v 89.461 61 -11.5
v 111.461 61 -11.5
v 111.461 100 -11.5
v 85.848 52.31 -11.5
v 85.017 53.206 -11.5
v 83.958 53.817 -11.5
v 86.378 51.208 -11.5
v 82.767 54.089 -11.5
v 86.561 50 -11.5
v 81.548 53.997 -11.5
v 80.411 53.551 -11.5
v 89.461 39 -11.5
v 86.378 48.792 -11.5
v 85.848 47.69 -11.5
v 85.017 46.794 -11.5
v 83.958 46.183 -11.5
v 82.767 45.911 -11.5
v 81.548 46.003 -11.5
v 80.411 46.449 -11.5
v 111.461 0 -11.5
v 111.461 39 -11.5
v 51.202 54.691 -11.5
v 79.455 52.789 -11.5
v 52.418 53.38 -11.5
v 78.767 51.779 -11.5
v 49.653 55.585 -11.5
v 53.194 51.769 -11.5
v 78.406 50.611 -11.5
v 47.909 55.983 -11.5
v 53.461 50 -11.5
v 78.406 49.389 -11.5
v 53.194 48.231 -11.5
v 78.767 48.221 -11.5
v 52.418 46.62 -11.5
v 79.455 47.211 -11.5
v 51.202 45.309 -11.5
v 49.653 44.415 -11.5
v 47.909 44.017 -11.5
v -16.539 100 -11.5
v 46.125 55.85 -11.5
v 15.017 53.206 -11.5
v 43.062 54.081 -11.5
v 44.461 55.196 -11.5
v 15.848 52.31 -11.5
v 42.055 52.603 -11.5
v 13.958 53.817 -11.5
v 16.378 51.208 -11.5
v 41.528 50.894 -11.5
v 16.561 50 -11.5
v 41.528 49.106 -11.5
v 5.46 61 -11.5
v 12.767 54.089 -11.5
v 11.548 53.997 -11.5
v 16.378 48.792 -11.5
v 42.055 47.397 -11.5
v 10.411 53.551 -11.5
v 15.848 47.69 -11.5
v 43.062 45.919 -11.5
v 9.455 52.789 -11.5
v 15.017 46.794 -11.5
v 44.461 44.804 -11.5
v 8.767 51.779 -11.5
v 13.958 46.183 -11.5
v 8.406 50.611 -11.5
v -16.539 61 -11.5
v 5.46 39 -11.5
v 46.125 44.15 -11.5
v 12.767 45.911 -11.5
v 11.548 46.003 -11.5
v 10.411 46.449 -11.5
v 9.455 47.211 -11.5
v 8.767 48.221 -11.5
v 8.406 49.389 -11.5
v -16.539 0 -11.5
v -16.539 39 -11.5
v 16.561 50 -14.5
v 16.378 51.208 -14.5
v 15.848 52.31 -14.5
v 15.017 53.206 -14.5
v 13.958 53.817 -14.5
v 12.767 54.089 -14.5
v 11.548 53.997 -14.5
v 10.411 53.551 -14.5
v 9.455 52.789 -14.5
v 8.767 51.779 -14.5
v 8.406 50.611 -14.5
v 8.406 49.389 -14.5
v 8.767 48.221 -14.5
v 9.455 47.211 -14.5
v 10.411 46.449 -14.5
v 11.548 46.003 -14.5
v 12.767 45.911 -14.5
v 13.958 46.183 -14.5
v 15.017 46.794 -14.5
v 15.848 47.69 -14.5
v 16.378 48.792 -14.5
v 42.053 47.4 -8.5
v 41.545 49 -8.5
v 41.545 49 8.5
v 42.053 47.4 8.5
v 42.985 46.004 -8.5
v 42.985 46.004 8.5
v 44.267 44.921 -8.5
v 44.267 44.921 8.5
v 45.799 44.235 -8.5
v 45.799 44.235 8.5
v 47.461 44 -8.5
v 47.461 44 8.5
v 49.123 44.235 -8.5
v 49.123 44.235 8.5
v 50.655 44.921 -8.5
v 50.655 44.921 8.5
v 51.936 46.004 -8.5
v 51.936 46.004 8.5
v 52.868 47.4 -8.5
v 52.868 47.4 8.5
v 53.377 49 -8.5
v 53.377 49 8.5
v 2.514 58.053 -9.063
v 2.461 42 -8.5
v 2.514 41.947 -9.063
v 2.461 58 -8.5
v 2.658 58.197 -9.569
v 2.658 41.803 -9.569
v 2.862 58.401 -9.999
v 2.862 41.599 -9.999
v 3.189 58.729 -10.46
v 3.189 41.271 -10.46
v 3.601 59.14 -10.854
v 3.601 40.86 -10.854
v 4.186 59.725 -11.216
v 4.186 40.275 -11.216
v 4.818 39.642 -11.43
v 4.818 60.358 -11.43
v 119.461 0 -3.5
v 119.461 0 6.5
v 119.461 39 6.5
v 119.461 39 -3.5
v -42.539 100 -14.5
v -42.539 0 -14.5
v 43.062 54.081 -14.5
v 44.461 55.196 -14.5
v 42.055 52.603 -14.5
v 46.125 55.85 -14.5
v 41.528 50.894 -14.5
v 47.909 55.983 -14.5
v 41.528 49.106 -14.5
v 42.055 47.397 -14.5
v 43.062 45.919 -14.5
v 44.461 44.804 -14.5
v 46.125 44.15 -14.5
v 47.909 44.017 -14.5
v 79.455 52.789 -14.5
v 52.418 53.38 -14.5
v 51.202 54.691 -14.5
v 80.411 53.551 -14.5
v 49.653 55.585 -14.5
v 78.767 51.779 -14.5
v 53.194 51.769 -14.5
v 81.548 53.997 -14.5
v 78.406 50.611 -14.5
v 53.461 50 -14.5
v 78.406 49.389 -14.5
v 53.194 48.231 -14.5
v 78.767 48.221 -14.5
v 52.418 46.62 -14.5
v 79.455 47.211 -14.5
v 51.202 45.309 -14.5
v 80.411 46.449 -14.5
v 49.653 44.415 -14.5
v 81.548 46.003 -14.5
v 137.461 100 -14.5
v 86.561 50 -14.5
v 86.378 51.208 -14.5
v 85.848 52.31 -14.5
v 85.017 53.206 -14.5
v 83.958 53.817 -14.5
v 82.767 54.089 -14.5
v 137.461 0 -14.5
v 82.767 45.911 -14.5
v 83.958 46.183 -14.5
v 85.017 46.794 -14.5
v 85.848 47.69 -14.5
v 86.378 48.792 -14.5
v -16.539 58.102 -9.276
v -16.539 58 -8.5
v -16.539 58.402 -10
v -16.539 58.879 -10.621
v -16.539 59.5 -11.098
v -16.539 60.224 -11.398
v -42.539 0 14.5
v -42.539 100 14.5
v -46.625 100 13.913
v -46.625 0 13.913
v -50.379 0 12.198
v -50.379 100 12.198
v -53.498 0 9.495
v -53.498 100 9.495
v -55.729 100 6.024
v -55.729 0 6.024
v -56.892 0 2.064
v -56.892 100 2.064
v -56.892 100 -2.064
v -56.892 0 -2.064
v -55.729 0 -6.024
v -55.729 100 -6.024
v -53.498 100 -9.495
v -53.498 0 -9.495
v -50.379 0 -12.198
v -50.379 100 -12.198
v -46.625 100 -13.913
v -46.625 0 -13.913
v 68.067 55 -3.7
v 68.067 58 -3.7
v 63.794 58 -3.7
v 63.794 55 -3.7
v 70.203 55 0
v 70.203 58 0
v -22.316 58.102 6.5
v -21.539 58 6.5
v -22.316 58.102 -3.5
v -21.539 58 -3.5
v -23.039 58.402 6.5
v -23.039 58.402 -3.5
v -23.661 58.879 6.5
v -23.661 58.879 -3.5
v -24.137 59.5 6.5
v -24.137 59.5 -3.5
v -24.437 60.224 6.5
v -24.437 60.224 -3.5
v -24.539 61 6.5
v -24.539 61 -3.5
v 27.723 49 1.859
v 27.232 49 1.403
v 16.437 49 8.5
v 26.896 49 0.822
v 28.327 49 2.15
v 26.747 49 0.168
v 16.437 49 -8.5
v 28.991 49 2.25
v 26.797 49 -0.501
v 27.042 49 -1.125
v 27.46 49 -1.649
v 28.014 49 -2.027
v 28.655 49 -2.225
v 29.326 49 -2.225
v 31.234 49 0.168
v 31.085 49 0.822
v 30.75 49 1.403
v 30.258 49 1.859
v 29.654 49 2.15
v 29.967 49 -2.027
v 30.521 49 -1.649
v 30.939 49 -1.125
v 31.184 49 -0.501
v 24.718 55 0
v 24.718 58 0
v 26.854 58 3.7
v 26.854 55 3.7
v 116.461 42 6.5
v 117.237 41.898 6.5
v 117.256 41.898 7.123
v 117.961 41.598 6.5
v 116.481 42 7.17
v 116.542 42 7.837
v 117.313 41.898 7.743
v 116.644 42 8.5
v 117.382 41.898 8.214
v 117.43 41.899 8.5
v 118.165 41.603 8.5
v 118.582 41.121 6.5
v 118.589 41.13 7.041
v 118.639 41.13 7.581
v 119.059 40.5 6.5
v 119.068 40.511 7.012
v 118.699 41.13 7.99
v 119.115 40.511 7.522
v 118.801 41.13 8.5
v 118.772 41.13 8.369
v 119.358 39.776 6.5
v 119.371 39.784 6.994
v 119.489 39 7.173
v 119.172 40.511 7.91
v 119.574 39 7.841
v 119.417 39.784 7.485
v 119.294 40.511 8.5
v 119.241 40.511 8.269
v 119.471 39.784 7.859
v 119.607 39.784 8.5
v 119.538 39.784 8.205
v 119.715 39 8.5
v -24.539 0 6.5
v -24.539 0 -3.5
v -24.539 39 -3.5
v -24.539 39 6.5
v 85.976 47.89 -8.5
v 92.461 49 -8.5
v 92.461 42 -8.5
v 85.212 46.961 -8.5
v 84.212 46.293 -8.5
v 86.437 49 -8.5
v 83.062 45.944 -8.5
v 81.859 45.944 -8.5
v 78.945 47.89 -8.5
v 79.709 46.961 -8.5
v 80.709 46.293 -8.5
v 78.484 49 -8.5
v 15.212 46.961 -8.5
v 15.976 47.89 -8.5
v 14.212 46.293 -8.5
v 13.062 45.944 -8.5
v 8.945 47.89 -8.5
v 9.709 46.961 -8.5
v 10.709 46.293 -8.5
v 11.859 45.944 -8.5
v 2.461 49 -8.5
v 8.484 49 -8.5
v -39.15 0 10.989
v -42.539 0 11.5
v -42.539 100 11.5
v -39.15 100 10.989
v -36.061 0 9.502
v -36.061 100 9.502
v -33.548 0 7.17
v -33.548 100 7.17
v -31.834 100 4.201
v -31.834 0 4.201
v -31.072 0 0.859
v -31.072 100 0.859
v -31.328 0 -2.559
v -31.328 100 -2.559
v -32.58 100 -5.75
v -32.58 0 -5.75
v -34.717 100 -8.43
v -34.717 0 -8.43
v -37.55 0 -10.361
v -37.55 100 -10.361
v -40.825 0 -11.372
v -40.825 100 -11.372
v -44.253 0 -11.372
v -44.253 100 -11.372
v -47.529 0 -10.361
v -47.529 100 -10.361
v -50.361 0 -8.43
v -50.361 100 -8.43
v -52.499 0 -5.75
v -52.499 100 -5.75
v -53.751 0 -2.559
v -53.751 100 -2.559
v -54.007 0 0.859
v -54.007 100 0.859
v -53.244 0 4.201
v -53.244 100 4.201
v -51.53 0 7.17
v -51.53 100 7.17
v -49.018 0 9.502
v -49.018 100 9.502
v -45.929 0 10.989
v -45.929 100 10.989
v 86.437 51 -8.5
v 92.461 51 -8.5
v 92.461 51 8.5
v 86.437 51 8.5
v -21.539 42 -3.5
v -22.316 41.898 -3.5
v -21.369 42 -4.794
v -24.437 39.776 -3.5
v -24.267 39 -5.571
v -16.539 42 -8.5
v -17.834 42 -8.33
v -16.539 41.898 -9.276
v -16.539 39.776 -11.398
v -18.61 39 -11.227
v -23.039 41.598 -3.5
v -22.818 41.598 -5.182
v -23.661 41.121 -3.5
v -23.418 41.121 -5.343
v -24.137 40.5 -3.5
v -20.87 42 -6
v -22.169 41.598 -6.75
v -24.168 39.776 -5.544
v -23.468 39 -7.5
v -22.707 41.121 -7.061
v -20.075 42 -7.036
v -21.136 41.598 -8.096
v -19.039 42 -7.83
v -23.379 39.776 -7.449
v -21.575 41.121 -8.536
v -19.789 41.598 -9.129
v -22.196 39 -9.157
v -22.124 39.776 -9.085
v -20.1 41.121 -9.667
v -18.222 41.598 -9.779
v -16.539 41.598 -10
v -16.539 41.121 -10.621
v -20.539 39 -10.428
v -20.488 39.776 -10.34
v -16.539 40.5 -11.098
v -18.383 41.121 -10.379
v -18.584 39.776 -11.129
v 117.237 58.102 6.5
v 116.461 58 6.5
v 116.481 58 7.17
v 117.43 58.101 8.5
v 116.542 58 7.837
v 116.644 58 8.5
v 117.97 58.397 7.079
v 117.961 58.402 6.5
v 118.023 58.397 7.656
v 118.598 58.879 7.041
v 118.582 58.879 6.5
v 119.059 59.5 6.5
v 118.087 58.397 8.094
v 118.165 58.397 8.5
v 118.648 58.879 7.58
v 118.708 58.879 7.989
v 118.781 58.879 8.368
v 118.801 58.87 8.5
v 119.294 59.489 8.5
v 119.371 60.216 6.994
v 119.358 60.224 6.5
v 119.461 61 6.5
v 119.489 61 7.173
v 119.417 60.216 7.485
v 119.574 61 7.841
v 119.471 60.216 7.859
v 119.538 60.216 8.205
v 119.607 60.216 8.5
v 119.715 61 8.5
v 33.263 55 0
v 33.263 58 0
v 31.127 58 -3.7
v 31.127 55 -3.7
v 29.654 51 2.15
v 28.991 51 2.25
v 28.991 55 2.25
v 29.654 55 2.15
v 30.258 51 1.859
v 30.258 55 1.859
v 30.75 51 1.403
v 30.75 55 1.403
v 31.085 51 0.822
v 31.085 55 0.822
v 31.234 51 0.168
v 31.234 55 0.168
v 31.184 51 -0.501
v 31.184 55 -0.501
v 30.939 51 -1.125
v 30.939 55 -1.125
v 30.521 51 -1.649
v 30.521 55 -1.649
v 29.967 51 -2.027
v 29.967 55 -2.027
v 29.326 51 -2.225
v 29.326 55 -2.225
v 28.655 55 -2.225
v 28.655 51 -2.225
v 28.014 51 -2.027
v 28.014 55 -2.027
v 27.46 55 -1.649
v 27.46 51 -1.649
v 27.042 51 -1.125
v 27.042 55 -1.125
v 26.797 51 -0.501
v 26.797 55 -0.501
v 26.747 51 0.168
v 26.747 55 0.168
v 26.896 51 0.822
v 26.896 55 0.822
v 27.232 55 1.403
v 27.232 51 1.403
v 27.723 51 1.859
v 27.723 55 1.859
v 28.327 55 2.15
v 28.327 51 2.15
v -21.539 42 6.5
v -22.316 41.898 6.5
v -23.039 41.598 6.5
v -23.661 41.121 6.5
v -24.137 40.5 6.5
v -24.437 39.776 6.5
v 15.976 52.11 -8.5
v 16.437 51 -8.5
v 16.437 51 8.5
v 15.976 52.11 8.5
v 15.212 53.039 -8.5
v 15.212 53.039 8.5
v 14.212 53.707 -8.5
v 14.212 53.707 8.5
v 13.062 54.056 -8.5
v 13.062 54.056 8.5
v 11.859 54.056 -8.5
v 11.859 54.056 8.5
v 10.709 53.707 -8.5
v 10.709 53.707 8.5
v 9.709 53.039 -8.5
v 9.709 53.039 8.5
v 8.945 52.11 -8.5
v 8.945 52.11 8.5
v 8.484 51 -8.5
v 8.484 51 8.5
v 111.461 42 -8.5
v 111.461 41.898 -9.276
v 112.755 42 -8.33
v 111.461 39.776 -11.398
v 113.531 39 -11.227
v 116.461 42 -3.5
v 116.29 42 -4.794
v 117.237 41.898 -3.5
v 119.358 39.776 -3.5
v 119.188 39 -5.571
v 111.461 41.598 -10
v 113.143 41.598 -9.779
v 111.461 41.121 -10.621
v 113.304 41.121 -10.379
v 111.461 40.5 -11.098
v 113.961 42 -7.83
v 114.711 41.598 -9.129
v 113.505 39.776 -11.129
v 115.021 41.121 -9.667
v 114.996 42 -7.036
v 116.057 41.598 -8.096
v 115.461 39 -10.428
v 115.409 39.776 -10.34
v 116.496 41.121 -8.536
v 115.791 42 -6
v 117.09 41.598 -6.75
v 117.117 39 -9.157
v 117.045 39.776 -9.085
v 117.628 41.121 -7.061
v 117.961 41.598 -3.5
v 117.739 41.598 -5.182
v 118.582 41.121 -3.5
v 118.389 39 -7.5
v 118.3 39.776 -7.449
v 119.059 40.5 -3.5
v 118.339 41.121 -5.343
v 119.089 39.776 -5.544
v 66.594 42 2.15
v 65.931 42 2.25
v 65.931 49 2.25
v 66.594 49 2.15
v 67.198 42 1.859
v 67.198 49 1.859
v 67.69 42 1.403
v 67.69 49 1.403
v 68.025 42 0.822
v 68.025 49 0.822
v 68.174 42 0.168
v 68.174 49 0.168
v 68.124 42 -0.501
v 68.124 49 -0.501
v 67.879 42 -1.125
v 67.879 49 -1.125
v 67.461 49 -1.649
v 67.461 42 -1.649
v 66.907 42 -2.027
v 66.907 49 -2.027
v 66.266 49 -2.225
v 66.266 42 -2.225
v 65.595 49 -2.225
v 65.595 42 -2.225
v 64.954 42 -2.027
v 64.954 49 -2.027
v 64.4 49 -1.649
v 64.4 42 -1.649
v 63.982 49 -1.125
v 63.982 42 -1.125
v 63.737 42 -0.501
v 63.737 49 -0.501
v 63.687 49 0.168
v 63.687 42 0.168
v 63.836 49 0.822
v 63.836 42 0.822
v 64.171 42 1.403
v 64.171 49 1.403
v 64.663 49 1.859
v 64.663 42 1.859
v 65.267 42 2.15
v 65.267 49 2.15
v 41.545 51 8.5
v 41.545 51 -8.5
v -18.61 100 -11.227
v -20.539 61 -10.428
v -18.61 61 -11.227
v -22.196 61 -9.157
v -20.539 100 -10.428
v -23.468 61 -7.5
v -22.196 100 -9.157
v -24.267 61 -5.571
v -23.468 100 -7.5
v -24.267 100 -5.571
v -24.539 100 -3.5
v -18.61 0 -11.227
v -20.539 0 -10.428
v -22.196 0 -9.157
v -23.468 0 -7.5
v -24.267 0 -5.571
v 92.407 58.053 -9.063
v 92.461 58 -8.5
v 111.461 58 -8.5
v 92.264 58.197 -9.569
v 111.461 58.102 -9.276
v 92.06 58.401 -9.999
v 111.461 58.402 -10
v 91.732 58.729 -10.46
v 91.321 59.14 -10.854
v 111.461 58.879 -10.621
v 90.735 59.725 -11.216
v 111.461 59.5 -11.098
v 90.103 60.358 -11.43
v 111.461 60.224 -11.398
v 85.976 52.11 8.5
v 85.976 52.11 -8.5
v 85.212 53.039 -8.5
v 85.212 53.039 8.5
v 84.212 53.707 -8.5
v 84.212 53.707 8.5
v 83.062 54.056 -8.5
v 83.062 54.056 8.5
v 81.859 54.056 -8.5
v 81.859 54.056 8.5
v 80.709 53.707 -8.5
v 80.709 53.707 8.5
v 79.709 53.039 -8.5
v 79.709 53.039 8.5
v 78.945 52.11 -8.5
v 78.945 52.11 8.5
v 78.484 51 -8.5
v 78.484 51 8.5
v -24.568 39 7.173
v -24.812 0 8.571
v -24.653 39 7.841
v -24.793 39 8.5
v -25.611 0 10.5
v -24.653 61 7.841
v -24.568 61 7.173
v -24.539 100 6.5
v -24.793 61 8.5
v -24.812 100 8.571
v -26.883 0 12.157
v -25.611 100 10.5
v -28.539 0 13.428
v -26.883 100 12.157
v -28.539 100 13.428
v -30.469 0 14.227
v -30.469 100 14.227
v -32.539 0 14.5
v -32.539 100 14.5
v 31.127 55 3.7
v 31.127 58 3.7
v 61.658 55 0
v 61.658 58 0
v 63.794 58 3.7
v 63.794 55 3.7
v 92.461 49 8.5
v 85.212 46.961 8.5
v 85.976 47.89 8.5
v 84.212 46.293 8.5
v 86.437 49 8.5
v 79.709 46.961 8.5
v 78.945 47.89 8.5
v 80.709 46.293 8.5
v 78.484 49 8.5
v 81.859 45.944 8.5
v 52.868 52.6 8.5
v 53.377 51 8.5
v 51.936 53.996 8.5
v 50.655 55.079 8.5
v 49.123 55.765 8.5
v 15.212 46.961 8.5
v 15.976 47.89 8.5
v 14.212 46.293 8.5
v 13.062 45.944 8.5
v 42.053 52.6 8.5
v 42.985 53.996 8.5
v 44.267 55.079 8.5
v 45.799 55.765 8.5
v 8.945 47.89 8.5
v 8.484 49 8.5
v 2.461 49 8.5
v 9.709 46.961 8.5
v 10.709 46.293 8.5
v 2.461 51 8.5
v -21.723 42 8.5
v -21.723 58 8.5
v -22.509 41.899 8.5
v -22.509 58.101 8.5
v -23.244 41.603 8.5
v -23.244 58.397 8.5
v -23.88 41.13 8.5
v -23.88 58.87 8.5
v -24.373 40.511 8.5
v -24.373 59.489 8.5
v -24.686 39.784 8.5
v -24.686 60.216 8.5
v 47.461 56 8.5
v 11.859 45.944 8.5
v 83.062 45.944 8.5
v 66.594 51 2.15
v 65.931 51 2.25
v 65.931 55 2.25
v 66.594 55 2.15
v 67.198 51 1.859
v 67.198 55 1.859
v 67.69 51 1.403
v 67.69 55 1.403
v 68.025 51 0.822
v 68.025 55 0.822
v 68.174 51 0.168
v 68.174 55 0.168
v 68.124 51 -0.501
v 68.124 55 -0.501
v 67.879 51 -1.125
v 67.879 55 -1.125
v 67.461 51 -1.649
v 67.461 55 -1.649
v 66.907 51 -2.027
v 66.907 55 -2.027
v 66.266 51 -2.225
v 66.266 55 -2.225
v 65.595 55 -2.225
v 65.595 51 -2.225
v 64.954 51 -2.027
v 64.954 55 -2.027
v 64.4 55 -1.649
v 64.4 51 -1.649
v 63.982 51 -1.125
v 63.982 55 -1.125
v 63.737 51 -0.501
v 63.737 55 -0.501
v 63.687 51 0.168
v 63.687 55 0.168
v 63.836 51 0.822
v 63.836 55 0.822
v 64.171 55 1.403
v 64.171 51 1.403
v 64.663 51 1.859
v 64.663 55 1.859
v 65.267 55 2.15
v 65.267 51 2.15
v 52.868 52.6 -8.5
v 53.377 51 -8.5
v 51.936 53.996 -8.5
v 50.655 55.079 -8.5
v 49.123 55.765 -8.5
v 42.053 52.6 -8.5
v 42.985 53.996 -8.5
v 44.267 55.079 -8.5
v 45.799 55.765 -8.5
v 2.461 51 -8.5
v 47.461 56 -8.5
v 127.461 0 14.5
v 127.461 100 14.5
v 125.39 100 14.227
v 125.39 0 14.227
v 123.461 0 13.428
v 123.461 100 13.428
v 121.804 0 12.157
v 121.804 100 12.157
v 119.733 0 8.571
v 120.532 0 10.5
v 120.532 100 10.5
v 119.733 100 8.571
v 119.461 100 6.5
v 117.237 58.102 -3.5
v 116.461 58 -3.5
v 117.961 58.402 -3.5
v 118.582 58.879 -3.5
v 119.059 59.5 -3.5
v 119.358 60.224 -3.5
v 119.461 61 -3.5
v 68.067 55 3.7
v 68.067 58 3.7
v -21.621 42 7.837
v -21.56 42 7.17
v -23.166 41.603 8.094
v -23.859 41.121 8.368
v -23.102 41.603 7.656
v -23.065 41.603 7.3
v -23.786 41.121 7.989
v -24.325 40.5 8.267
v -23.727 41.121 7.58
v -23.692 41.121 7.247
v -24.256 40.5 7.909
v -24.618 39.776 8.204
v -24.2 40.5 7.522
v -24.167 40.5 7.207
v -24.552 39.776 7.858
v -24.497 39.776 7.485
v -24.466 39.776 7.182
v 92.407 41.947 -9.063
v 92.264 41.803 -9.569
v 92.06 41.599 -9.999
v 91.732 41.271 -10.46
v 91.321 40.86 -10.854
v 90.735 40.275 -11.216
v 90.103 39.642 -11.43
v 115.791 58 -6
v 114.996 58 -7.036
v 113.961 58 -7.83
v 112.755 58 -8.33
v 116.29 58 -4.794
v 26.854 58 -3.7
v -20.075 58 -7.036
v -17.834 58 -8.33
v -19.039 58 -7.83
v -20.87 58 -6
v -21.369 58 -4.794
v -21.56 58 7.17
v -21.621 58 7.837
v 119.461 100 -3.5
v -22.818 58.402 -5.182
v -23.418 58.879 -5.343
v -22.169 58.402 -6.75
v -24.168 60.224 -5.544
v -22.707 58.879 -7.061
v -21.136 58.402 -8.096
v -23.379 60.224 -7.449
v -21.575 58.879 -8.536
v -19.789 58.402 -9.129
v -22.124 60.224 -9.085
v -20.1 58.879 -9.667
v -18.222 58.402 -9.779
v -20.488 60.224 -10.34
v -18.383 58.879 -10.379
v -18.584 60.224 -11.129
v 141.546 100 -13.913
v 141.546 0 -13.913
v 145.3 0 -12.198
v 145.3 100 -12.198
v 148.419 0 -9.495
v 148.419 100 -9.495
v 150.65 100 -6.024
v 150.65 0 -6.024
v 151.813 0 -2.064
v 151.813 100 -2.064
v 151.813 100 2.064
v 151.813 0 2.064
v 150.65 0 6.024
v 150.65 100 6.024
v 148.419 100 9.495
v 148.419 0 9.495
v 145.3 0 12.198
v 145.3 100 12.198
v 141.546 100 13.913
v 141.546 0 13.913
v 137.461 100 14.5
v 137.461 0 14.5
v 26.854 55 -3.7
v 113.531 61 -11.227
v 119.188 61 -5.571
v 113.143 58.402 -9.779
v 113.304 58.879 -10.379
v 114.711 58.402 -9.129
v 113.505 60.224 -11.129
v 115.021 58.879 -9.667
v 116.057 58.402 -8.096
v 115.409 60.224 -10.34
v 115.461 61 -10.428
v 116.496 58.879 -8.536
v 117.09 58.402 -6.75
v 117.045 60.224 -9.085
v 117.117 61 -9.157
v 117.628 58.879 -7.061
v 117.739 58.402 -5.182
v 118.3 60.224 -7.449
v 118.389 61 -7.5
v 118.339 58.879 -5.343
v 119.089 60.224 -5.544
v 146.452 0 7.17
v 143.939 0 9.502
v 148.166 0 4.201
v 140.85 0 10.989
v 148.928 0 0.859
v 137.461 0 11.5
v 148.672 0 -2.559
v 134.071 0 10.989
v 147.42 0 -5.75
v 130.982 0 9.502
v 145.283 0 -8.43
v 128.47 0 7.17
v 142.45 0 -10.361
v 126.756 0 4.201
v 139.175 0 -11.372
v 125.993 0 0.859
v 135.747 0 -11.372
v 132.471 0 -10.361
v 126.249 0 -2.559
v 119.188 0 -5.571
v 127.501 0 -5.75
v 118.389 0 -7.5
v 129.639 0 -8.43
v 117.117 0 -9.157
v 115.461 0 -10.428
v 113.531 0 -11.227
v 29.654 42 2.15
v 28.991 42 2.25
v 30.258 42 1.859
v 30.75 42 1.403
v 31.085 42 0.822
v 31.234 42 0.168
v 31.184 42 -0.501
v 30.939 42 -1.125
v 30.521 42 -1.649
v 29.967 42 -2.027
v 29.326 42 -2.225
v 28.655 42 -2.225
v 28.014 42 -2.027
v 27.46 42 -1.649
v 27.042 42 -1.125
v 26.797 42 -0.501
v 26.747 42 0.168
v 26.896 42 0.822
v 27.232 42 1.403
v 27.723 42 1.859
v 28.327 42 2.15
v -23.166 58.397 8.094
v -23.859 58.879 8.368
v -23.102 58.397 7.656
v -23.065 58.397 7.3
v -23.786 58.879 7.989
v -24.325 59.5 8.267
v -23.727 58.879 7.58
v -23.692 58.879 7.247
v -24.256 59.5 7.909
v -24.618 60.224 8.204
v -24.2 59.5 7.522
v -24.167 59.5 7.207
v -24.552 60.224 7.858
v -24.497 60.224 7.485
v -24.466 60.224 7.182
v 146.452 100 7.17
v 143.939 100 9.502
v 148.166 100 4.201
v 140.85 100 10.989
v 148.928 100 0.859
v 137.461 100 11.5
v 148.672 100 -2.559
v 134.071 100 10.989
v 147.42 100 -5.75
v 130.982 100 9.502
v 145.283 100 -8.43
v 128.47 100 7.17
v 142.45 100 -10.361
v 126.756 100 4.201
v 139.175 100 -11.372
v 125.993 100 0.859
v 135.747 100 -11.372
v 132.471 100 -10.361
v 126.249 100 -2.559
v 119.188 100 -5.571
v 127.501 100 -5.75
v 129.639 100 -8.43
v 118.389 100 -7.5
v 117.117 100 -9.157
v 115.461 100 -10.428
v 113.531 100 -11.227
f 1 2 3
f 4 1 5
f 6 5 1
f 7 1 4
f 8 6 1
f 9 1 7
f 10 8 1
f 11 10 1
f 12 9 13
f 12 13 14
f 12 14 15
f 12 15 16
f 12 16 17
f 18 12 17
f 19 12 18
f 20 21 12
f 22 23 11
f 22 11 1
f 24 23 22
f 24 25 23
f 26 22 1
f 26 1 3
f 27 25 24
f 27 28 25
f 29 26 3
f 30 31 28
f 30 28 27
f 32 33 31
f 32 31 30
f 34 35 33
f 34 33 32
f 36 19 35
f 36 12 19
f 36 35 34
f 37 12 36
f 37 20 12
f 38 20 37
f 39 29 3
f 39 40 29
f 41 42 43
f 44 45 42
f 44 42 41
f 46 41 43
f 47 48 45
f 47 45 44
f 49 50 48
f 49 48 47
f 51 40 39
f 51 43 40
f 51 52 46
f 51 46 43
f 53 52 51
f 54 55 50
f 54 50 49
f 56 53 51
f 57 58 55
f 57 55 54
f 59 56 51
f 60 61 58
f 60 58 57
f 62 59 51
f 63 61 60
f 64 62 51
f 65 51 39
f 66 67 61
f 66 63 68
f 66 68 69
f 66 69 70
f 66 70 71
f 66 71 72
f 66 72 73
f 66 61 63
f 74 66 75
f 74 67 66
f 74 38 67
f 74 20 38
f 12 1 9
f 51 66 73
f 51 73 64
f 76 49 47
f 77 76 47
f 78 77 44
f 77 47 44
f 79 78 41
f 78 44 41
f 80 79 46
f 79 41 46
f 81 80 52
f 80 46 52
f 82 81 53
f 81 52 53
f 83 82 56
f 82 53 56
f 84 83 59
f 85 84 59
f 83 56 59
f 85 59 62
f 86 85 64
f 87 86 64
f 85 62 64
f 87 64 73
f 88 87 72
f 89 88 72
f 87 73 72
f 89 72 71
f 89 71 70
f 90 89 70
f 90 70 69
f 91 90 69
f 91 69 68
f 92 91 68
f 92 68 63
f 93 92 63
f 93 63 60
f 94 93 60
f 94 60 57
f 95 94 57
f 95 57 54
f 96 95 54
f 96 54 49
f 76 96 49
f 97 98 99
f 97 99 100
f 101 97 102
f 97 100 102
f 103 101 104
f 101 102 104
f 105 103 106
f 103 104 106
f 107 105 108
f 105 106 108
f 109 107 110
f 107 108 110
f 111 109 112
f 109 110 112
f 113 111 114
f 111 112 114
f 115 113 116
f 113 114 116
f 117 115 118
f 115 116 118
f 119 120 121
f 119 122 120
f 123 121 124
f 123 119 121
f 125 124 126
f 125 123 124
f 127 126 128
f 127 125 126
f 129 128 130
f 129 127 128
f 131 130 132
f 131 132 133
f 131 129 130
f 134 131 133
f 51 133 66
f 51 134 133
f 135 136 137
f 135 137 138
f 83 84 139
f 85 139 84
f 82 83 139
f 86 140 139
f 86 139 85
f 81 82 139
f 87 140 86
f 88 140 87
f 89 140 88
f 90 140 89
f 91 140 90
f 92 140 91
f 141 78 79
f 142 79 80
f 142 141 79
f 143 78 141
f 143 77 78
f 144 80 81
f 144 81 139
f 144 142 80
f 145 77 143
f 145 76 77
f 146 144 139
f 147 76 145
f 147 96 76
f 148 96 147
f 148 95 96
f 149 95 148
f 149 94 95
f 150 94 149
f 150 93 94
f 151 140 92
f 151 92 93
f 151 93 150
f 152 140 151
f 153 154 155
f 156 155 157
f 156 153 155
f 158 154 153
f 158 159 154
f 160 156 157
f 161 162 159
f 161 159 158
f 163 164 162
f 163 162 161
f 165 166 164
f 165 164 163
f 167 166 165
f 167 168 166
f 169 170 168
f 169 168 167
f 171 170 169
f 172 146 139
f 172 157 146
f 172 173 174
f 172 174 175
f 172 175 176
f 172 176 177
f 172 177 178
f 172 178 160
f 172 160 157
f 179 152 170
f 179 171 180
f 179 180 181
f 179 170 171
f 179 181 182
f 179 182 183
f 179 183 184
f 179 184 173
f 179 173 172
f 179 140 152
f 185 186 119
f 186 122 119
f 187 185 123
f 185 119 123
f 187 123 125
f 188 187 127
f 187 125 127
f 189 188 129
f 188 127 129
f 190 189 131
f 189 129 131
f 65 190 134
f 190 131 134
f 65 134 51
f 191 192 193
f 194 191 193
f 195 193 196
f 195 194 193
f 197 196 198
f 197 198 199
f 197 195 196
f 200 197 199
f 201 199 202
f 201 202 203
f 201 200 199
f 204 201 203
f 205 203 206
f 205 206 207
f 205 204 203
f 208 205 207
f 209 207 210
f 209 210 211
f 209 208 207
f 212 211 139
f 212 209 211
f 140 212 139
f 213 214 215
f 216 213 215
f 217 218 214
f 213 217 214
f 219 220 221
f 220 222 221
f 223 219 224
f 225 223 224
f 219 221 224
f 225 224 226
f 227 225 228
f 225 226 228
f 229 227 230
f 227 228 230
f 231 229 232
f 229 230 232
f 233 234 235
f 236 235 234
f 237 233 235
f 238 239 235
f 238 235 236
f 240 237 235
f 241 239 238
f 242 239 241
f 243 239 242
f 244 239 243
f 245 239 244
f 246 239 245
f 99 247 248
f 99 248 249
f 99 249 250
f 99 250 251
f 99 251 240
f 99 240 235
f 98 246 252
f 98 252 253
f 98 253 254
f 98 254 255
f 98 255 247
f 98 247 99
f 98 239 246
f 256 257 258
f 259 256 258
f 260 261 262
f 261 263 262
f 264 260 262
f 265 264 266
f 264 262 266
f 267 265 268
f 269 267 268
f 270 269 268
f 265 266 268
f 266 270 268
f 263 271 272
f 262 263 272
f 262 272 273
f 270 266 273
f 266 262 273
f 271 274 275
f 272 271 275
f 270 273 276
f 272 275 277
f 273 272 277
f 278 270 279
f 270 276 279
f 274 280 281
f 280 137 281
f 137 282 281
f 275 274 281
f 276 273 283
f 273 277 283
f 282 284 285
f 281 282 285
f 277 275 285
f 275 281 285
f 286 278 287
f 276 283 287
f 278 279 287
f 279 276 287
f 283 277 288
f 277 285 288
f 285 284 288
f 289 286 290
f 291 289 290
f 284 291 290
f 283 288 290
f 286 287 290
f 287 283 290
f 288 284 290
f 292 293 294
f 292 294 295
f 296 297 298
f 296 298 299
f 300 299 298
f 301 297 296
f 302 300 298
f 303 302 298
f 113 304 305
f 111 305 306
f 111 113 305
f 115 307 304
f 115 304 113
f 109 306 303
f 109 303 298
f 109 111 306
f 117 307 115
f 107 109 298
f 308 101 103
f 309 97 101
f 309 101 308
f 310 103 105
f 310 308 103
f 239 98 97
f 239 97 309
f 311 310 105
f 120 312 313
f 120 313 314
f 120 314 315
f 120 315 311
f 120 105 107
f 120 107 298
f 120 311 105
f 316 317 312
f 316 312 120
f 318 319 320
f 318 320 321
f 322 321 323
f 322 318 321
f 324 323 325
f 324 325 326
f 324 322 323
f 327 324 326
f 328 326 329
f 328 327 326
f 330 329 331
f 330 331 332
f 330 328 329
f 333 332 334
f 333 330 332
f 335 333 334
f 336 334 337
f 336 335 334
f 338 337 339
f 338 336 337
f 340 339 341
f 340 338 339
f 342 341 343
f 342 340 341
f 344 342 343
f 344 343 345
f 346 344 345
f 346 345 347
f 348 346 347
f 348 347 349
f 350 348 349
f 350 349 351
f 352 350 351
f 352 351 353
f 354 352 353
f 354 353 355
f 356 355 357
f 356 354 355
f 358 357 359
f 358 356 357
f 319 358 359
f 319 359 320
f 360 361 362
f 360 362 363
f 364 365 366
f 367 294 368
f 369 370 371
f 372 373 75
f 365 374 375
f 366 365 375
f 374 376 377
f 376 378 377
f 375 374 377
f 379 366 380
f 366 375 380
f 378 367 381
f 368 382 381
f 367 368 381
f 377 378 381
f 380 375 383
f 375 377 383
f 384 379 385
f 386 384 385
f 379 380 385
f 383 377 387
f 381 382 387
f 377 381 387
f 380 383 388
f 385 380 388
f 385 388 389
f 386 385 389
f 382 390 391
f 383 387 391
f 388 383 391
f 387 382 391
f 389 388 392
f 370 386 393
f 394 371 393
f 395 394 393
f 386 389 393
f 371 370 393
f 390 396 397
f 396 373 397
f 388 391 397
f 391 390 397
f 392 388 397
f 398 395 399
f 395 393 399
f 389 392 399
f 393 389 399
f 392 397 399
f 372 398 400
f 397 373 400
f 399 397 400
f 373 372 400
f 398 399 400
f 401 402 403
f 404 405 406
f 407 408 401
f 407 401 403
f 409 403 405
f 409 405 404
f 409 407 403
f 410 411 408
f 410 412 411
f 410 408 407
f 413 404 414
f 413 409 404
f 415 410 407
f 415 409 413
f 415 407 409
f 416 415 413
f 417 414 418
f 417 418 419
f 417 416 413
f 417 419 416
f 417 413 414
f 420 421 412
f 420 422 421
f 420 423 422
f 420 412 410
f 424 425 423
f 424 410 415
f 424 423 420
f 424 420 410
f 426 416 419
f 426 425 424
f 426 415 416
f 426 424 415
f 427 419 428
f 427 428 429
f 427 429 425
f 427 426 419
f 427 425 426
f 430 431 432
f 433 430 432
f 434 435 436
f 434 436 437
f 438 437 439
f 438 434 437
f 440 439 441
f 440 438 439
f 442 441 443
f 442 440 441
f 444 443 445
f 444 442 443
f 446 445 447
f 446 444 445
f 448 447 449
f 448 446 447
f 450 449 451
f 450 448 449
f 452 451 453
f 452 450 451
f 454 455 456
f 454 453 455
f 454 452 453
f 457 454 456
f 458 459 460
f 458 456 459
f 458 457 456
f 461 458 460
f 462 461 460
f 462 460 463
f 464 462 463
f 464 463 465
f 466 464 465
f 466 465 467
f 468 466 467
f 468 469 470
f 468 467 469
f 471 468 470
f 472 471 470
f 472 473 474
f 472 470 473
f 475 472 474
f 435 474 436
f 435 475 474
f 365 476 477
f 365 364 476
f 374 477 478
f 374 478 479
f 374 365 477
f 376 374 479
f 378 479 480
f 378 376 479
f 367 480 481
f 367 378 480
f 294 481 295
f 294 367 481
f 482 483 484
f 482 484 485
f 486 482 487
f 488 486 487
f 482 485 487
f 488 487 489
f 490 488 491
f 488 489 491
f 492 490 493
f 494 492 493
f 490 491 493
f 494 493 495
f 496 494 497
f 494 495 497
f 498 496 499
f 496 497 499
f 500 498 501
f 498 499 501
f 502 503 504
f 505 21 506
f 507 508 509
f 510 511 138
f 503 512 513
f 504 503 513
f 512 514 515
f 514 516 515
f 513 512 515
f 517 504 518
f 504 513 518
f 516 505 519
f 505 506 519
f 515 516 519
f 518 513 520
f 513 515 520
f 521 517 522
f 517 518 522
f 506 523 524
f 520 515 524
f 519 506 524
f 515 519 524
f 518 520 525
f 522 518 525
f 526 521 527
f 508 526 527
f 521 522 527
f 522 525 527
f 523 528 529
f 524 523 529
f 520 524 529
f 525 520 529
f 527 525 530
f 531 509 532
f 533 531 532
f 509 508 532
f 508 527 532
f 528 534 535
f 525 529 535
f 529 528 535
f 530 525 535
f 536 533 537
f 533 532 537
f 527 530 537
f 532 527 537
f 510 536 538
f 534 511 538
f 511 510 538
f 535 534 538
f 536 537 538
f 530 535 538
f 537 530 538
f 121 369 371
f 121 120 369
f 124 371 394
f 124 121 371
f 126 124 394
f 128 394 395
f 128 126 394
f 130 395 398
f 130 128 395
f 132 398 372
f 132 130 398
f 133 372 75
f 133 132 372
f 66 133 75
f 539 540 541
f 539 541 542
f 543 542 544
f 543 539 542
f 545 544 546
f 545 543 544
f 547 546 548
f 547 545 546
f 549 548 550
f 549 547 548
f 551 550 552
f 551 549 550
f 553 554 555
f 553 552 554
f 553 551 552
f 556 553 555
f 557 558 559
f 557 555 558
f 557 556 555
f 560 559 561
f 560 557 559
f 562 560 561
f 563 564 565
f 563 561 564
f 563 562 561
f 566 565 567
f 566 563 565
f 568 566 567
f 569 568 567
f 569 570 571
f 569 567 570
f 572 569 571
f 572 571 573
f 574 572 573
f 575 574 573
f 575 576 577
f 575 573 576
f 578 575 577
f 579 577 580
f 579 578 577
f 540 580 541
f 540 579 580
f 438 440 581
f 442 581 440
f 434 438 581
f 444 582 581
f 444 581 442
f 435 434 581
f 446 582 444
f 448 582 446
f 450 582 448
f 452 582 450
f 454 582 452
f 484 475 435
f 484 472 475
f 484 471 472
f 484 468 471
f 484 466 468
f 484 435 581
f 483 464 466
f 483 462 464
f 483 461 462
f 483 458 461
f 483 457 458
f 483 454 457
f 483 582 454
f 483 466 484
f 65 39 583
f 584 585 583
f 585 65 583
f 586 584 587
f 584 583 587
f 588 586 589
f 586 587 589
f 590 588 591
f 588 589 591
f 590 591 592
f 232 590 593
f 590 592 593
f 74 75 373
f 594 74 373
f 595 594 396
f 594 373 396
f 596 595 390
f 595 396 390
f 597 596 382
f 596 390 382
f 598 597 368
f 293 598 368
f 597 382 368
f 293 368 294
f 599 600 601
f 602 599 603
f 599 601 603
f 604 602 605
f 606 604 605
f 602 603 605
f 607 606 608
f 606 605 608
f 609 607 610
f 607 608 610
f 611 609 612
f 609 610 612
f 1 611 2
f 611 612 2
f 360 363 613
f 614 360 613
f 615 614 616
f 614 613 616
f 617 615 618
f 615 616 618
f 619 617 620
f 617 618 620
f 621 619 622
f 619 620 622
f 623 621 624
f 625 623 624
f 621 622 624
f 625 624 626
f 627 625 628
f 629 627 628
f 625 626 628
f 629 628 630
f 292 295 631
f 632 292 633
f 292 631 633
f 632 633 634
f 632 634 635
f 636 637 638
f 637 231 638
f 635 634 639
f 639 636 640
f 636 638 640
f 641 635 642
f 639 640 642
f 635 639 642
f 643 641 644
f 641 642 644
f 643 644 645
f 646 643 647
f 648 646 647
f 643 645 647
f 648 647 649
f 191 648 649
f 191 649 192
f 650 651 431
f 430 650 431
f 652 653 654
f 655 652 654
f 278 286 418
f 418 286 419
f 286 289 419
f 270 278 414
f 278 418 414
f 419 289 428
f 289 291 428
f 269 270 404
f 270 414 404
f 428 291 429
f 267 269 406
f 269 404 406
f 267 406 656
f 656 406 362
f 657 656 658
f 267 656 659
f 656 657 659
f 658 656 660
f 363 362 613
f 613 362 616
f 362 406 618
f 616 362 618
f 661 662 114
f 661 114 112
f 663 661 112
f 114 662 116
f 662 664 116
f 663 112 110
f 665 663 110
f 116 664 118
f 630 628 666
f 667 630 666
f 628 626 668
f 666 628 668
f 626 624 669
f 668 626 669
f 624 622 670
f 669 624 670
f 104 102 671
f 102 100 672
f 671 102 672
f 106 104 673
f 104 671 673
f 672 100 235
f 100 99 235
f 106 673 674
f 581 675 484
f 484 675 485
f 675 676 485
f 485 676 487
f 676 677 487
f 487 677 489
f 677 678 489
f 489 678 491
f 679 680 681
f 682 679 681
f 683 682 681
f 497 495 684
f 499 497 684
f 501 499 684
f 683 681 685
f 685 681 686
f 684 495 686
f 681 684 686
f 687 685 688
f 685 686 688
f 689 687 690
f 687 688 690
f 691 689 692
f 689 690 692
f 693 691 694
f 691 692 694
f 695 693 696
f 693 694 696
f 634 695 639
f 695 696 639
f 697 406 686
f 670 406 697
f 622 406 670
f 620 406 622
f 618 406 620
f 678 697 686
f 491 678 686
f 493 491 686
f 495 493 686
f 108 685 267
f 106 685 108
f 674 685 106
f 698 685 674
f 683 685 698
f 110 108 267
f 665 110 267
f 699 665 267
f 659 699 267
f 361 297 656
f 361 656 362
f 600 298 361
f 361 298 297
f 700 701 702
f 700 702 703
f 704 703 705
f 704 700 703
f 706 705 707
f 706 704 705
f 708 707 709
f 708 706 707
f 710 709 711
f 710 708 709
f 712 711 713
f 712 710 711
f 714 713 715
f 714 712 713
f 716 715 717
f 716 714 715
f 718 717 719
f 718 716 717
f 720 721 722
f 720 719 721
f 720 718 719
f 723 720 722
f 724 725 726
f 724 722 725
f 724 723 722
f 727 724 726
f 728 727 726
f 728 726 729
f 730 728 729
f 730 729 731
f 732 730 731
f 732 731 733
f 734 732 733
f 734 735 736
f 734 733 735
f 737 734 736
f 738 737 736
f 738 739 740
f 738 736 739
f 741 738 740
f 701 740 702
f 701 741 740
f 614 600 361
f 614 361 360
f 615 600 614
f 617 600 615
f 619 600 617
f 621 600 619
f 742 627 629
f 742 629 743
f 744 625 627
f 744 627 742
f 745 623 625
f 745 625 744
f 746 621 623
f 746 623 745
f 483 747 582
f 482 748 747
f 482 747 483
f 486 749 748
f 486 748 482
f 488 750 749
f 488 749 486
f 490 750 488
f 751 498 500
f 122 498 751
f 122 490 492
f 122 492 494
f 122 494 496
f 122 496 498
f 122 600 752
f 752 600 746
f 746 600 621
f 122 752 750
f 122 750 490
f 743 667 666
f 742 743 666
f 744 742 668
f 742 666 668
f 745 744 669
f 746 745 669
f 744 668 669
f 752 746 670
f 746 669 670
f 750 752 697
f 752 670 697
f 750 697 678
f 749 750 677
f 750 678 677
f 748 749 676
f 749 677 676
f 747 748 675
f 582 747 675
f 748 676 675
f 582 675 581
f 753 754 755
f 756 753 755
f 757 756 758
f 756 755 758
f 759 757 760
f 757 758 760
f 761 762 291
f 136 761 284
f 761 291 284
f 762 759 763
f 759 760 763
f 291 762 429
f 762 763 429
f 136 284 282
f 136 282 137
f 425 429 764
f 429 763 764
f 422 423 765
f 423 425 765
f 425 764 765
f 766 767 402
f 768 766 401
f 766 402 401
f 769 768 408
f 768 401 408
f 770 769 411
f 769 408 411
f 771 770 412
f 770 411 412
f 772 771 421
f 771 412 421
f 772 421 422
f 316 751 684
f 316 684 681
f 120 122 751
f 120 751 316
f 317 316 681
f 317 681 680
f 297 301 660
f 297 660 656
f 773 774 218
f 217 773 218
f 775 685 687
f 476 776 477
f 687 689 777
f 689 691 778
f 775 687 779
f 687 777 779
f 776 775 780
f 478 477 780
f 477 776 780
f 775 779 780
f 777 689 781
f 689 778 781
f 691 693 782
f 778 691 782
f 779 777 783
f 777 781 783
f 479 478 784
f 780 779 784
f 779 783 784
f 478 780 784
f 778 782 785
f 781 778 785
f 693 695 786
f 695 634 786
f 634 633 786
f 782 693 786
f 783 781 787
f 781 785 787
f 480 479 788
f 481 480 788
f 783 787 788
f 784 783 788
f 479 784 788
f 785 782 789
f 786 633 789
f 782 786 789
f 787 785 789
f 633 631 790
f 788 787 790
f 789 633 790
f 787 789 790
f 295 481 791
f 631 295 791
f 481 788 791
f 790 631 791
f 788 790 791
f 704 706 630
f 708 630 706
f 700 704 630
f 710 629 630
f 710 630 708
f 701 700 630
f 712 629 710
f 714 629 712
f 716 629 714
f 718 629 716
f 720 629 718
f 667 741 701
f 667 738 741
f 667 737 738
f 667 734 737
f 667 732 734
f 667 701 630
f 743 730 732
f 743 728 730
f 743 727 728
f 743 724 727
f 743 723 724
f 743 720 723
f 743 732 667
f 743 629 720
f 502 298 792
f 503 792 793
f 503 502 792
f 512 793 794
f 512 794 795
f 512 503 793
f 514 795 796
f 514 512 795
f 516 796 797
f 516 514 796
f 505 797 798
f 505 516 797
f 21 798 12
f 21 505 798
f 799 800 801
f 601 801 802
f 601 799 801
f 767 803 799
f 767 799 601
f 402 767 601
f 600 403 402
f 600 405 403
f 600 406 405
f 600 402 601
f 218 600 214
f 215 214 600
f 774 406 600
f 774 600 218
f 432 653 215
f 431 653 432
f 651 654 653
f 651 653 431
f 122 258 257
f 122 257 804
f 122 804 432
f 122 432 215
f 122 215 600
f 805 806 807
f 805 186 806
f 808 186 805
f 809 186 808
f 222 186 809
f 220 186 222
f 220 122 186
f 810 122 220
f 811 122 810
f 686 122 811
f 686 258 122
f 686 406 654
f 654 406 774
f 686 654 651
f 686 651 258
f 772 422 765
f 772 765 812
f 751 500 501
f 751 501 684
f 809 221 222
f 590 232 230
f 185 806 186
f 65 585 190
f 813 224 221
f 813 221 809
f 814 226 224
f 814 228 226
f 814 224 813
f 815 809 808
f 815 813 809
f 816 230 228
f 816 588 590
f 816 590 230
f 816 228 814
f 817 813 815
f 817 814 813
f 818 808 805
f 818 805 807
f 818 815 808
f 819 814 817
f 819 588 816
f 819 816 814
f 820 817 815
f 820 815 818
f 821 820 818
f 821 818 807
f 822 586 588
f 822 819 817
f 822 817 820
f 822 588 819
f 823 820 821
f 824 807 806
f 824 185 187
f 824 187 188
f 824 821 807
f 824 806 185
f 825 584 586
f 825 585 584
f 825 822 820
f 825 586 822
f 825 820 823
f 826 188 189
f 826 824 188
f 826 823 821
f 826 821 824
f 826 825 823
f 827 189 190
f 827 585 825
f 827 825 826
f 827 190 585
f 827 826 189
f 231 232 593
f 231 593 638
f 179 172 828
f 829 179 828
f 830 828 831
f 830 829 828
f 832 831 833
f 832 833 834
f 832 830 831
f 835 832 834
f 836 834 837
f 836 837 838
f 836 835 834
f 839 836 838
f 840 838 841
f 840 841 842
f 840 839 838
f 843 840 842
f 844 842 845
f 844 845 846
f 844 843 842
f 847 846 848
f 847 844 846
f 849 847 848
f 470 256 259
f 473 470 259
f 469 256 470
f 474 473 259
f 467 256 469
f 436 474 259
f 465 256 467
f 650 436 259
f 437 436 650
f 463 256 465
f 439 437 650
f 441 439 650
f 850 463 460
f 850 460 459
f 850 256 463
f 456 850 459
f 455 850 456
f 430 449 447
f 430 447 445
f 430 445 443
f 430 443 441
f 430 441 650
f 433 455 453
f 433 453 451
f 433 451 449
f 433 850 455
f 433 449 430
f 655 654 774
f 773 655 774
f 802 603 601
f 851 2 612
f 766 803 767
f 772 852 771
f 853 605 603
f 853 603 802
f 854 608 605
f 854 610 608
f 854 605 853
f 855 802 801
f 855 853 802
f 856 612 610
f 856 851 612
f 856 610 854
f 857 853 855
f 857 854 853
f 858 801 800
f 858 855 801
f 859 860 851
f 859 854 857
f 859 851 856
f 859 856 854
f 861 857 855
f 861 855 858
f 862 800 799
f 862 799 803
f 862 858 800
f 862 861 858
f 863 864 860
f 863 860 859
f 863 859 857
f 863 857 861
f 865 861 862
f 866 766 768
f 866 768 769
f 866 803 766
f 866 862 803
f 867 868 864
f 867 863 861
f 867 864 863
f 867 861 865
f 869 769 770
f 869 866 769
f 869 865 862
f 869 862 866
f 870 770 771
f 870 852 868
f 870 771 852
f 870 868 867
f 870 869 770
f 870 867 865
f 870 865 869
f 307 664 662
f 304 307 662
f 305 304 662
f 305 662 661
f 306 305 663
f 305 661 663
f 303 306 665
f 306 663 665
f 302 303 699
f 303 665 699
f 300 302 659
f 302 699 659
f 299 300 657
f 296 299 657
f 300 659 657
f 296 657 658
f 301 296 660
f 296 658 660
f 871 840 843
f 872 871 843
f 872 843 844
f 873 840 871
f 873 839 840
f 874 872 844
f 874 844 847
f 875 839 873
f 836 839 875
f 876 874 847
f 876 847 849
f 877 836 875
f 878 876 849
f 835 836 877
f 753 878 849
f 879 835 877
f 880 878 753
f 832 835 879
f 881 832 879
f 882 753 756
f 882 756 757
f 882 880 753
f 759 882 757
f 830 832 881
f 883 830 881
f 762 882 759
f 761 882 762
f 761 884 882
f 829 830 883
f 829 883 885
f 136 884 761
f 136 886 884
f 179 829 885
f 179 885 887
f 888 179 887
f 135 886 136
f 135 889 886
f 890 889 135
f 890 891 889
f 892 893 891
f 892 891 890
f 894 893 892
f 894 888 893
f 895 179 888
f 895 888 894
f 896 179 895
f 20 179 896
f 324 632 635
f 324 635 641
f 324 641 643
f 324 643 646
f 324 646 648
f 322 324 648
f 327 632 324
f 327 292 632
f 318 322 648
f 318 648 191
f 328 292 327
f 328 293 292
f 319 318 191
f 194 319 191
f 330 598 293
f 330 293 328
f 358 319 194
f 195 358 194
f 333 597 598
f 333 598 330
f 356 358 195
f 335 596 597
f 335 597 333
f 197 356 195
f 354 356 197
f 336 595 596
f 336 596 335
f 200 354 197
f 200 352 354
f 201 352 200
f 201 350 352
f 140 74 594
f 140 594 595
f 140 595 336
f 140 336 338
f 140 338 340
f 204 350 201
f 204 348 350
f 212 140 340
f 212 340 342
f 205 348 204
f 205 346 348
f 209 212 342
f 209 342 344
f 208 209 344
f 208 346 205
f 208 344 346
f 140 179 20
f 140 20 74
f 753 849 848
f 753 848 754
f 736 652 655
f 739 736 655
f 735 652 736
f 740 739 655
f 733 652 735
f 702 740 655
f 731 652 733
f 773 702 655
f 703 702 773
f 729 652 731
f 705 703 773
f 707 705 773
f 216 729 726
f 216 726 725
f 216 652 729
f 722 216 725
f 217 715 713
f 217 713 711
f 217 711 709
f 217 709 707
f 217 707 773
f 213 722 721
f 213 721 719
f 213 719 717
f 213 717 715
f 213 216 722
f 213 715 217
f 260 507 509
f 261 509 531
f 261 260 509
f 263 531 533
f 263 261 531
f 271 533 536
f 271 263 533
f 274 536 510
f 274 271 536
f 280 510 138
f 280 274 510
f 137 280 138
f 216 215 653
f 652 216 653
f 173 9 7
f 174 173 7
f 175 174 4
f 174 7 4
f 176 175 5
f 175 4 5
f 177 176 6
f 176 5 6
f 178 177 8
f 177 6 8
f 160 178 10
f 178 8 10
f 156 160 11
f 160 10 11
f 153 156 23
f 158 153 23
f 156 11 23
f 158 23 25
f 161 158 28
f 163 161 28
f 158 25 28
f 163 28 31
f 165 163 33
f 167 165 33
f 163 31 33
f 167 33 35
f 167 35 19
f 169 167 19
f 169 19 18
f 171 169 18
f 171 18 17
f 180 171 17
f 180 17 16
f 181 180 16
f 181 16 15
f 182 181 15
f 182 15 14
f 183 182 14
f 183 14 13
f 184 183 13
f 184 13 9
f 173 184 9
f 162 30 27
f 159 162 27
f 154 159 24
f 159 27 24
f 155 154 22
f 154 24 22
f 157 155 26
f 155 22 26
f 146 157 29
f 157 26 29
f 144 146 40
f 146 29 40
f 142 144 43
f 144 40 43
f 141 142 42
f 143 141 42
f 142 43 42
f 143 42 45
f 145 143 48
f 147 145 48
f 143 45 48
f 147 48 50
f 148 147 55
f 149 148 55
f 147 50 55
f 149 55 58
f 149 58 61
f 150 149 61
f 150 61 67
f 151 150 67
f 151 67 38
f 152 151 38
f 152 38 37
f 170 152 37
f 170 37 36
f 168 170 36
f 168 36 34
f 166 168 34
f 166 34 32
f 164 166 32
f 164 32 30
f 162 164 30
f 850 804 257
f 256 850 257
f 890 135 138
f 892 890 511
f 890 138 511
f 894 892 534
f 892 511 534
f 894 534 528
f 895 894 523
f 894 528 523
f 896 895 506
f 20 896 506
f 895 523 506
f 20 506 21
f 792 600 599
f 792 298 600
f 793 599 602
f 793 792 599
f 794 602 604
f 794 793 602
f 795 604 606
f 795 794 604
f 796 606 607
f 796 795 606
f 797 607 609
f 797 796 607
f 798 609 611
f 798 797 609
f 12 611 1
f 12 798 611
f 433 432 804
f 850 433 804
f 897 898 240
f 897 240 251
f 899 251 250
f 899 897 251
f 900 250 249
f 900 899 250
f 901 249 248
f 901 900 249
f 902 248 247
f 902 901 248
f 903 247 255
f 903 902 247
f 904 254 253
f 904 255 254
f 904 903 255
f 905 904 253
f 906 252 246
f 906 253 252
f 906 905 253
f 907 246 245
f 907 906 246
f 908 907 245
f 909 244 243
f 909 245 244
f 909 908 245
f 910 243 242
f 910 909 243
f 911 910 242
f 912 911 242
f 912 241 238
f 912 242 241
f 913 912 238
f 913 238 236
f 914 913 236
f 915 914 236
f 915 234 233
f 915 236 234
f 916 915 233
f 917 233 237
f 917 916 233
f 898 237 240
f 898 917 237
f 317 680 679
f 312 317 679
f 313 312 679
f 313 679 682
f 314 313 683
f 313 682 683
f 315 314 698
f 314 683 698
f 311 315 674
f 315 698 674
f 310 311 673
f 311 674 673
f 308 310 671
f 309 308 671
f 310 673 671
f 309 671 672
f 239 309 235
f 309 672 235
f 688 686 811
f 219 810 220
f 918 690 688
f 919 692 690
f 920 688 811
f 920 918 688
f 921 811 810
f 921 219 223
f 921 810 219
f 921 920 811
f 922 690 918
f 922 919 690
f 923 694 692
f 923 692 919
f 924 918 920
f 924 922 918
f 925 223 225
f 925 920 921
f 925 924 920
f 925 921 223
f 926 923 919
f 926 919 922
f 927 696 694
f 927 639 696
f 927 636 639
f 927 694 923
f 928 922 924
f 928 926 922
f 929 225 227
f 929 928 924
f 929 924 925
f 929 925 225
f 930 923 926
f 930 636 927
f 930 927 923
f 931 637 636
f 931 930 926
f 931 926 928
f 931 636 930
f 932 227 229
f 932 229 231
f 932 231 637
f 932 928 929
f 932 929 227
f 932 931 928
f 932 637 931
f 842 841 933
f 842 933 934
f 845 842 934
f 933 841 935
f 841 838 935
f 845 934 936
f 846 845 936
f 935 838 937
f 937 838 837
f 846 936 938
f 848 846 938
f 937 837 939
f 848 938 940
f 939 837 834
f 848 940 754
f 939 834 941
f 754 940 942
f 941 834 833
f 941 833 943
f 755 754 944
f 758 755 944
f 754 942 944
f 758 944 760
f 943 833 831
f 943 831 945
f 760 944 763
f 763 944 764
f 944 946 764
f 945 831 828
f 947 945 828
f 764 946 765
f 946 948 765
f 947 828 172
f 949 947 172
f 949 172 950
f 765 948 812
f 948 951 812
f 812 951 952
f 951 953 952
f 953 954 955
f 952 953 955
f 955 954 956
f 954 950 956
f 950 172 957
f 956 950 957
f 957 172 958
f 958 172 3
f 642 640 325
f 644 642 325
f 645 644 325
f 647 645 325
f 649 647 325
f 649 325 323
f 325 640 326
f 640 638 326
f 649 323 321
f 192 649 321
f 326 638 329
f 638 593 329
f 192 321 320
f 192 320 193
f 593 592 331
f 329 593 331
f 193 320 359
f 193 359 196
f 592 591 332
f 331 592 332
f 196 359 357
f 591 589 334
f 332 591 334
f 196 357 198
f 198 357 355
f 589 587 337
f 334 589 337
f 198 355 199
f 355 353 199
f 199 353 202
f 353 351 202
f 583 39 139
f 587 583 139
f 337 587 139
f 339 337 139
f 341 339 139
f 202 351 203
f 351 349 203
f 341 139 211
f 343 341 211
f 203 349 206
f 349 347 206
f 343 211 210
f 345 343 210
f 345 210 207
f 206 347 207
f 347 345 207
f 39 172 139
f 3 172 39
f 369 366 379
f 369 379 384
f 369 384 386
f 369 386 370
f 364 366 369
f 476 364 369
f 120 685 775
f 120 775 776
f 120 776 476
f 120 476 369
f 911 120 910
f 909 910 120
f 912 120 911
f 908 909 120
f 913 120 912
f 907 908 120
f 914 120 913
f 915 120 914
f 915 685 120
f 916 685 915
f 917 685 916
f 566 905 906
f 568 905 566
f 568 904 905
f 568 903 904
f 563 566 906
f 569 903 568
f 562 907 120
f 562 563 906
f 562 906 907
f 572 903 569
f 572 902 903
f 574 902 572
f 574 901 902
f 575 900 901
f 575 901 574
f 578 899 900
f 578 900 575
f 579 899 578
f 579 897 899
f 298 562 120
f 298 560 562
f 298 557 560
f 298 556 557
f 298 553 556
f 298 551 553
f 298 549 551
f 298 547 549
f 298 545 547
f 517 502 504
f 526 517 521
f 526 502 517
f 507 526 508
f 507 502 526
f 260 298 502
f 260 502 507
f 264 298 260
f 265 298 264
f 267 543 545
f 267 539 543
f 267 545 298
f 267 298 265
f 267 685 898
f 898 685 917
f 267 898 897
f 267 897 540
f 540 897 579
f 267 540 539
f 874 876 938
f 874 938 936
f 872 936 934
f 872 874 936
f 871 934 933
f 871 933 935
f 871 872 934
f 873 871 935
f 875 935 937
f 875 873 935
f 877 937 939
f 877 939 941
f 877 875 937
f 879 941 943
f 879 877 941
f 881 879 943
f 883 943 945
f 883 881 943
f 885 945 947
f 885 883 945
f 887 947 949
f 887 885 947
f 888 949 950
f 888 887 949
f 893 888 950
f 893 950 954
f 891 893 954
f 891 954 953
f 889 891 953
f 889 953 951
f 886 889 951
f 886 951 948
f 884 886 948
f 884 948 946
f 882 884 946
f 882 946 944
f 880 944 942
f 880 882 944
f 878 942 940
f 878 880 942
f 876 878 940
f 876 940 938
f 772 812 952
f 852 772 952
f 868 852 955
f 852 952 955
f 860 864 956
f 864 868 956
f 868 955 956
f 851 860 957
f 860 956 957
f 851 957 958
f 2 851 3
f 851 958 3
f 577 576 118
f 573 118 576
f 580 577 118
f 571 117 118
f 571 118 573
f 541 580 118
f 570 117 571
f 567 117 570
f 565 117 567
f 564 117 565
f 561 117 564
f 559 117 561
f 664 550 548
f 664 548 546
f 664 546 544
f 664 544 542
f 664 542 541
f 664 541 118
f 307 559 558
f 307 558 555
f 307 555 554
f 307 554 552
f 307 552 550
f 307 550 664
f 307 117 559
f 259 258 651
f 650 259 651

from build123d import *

# Parameters (mm, degrees)
SKETCH1_R                    = 11.5
BOSS_EXTRUDE1_DEPTH          = 100
FILLET1_R                    = 8
SKETCH2_R                    = 4.1
SKETCH2_R_2                  = 6
CUT_EXTRUDE1_DEPTH           = 10
BOSS_EXTRUDE2_START          = 20
SKETCH3_R                    = 4.1
SKETCH3_R_2                  = 6
BOSS_EXTRUDE2_DEPTH          = 20
FILLET2_R                    = 3
CUT_EXTRUDE_THIN1_DEPTH      = 184.360351078
CUT_EXTRUDE_THIN1_DEPTH_BACK = 20
CUT_EXTRUDE_THIN2_DEPTH      = 164.298096582
CUT_EXTRUDE_THIN2_DEPTH_BACK = 20
FILLET3_R                    = 3
CUT_EXTRUDE2_DEPTH           = 161.944923335
CUT_EXTRUDE2_DEPTH_BACK      = 161.944923335
SKETCH6_R                    = 2.25
CUT_EXTRUDE3_DEPTH           = 3


with BuildPart() as part:
    # Sketch1 → Boss-Extrude1 (new body)
    with BuildSketch(Plane(origin=(0, 0, 0), x_dir=(1, 0, 0), z_dir=(0, 1, 0))):
        with BuildLine():
            Line((137.460581558, -14.5), (119.460581558, -14.5))
            Line((119.460581558, -14.5), (119.460581558, 11.5))
            Line((119.460581558, 11.5), (-24.539418442, 11.5))
            Line((-24.539418442, 11.5), (-24.539418442, -14.5))
            Line((-24.539418442, -14.5), (-42.539418442, -14.5))
            ThreePointArc((-42.539418442, -14.5), (-57.039418442, 0), (-42.539418442, 14.5))
            Line((-42.539418442, 14.5), (137.460581558, 14.5))
            ThreePointArc((137.460581558, 14.5), (151.960581558, 0), (137.460581558, -14.5))
        make_face()
        with Locations(Location((-42.539418442, 0, 0), (0, 0, 270))):
            Circle(SKETCH1_R, mode=Mode.SUBTRACT)
        with Locations(Location((137.460581558, 0, 0), (0, 0, 270))):
            Circle(SKETCH1_R, mode=Mode.SUBTRACT)
    extrude(amount=BOSS_EXTRUDE1_DEPTH)

    # Fillet1
    fillet1_edges = [part.edges().sort_by_distance(p)[0] for p in [
        (119.460581558, 50, 14.5),
        (119.460581558, 50, -11.5),
        (-24.539418442, 50, -11.5),
        (-24.539418442, 50, 14.5),
    ]]
    fillet(fillet1_edges, radius=FILLET1_R)

    # Sketch2 → Cut-Extrude1 (cut)
    with BuildSketch(Plane.XY.offset(-11.5)):
        with Locations((12.460581558, 50)):
            Circle(SKETCH2_R)
        with Locations((82.460581558, 50)):
            Circle(SKETCH2_R)
        with Locations((47.460581558, 50)):
            Circle(SKETCH2_R_2)
    extrude(amount=-CUT_EXTRUDE1_DEPTH, mode=Mode.SUBTRACT)

    # Sketch3 → Boss-Extrude2 (add)
    with BuildSketch(Plane.XY.offset(-11.5).offset(BOSS_EXTRUDE2_START)):
        Polygon((12.460581558, 58), (82.460581558, 58), (124.149440998, 58), (124.149440998, 42), (82.460581558, 42), (12.460581558, 42), (-28.8662965, 42), (-28.8662965, 58), (-16.539418442, 58), align=None)
        with Locations((12.460581558, 50)):
            Circle(SKETCH3_R, mode=Mode.SUBTRACT)
        with Locations((82.460581558, 50)):
            Circle(SKETCH3_R, mode=Mode.SUBTRACT)
        with Locations((47.460581558, 50)):
            Circle(SKETCH3_R_2, mode=Mode.SUBTRACT)
    extrude(amount=-BOSS_EXTRUDE2_DEPTH)

    # Fillet2
    fillet2_edges = [part.edges().sort_by_distance(p)[0] for p in [
        (-24.603180872, 58, 7.50803434),
        (-24.603180872, 42, 7.50803434),
        (47.460581558, 42, -11.5),
        (117.117435807, 42, -9.156854249),
        (119.460581558, 42, 1.5),
        (-24.539418442, 42, 1.5),
        (-22.196272692, 42, -9.156854249),
        (119.524343988, 42, 7.50803434),
        (119.460581558, 58, 1.5),
        (117.117435807, 58, -9.156854249),
        (47.460581558, 58, -11.5),
        (-22.196272692, 58, -9.156854249),
        (-24.539418442, 58, 1.5),
        (119.524343988, 58, 7.50803434),
    ]]
    fillet(fillet2_edges, radius=FILLET2_R)

    # Sketch4 → Cut-Extrude-Thin1 (cut, two sides: drawn at the far end of the back side and taken through both)
    with BuildSketch(Plane.XY.offset(8.5).offset(-CUT_EXTRUDE_THIN1_DEPTH_BACK)):
        Polygon((92.460581558, 51), (47.460581558, 51), (2.460581558, 51), (2.460581558, 49), (47.460581558, 49), (92.460581558, 49), align=None)
    extrude(amount=CUT_EXTRUDE_THIN1_DEPTH + CUT_EXTRUDE_THIN1_DEPTH_BACK, mode=Mode.SUBTRACT)

    # Sketch5 → Cut-Extrude-Thin2 (cut, two sides: drawn at the far end of the back side and taken through both)
    with BuildSketch(Plane(origin=(0, 42, 0), x_dir=(-1, 0, 0), z_dir=(0, -1, 0)).offset(-CUT_EXTRUDE_THIN2_DEPTH_BACK)):
        Polygon((-2.460581558, 8.5), (-47.460581558, 8.5), (-92.460581558, 8.5), (-92.460581558, 11.5), (-47.460581558, 11.5), (-2.460581558, 11.5), align=None)
    extrude(amount=CUT_EXTRUDE_THIN2_DEPTH + CUT_EXTRUDE_THIN2_DEPTH_BACK, mode=Mode.SUBTRACT)

    # Fillet3
    fillet3_edges = [part.edges().sort_by_distance(p)[0] for p in [
        (2.460581558, 50, -11.5),
        (92.460581558, 50, -11.5),
    ]]
    fillet(fillet3_edges, radius=FILLET3_R - 0.0001)  # a hair under: the kernel refuses the full size

    # Sketch6 → Cut-Extrude2 (cut, two sides: drawn at the far end of the back side and taken through both)
    with BuildSketch(Plane(origin=(0, 49, 0), x_dir=(1, 0, 0), z_dir=(0, 1, 0)).offset(-CUT_EXTRUDE2_DEPTH_BACK)):
        with Locations(Location((28.990631201, 0, 0), (0, 0, 270))):
            Circle(SKETCH6_R)
        with Locations(Location((65.930531914, 0, 0), (0, 0, 270))):
            Circle(SKETCH6_R)
    extrude(amount=CUT_EXTRUDE2_DEPTH + CUT_EXTRUDE2_DEPTH_BACK, mode=Mode.SUBTRACT)

    # Sketch7 → Cut-Extrude3 (cut)
    with BuildSketch(Plane(origin=(0, 58, 0), x_dir=(1, 0, 0), z_dir=(0, 1, 0))):
        Polygon((33.263023193, 0), (31.126827197, 3.7), (26.854435205, 3.7), (24.718239209, 0), (26.854435205, -3.7), (31.126827197, -3.7), align=None)
        Polygon((70.202923906, 0), (68.06672791, 3.7), (63.794335918, 3.7), (61.658139922, 0), (63.794335918, -3.7), (68.06672791, -3.7), align=None)
    extrude(amount=-CUT_EXTRUDE3_DEPTH, mode=Mode.SUBTRACT)


solid = part.part
